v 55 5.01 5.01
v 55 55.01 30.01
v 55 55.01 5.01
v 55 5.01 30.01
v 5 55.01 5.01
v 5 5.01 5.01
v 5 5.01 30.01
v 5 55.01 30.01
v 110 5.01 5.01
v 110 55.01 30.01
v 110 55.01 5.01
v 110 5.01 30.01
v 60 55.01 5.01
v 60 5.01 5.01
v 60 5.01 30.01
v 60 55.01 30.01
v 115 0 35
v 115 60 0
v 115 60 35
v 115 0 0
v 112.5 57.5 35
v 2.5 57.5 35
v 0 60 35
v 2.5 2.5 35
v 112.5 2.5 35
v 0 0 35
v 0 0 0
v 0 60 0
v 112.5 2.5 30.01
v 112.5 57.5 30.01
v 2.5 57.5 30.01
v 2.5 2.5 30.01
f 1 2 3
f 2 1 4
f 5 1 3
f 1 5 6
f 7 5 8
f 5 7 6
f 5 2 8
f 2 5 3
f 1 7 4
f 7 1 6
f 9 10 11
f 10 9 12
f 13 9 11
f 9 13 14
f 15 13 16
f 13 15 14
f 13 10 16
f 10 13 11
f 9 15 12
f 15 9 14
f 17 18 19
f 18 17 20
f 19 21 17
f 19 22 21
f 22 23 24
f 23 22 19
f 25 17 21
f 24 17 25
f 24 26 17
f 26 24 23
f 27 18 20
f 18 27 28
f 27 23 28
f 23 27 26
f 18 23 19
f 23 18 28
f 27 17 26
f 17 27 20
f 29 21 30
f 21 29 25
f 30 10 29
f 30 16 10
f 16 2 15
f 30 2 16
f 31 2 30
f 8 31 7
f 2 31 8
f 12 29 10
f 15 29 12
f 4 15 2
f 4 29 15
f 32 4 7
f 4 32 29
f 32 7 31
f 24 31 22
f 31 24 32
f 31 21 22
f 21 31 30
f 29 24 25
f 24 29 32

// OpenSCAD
numberOfBays = 2;
bayW = 50;
bayH = 30;
bayD = 50;
eps = 0.01; 
wall_width = 5;
width = numberOfBays * bayW + (numberOfBays) * wall_width + wall_width;
height = bayH + wall_width;
depth = bayD + wall_width*2;

module bay() {
    cube([bayW,bayD,bayH]);
}

module bays() {
    difference(){
        cube([width, depth, height]);
        for (i = [0:numberOfBays-1]) {
        translate([i * (bayW + wall_width)+wall_width, wall_width+eps, wall_width+eps]) {
            bay();
        }
    }
    }
    
}

module cutout(){
    color("red")
    translate([wall_width/2, wall_width/2, height - wall_width + eps])
    cube([width - wall_width, depth - wall_width, wall_width]);
}

difference(){
    bays();
    cutout();

}

//cutout();
